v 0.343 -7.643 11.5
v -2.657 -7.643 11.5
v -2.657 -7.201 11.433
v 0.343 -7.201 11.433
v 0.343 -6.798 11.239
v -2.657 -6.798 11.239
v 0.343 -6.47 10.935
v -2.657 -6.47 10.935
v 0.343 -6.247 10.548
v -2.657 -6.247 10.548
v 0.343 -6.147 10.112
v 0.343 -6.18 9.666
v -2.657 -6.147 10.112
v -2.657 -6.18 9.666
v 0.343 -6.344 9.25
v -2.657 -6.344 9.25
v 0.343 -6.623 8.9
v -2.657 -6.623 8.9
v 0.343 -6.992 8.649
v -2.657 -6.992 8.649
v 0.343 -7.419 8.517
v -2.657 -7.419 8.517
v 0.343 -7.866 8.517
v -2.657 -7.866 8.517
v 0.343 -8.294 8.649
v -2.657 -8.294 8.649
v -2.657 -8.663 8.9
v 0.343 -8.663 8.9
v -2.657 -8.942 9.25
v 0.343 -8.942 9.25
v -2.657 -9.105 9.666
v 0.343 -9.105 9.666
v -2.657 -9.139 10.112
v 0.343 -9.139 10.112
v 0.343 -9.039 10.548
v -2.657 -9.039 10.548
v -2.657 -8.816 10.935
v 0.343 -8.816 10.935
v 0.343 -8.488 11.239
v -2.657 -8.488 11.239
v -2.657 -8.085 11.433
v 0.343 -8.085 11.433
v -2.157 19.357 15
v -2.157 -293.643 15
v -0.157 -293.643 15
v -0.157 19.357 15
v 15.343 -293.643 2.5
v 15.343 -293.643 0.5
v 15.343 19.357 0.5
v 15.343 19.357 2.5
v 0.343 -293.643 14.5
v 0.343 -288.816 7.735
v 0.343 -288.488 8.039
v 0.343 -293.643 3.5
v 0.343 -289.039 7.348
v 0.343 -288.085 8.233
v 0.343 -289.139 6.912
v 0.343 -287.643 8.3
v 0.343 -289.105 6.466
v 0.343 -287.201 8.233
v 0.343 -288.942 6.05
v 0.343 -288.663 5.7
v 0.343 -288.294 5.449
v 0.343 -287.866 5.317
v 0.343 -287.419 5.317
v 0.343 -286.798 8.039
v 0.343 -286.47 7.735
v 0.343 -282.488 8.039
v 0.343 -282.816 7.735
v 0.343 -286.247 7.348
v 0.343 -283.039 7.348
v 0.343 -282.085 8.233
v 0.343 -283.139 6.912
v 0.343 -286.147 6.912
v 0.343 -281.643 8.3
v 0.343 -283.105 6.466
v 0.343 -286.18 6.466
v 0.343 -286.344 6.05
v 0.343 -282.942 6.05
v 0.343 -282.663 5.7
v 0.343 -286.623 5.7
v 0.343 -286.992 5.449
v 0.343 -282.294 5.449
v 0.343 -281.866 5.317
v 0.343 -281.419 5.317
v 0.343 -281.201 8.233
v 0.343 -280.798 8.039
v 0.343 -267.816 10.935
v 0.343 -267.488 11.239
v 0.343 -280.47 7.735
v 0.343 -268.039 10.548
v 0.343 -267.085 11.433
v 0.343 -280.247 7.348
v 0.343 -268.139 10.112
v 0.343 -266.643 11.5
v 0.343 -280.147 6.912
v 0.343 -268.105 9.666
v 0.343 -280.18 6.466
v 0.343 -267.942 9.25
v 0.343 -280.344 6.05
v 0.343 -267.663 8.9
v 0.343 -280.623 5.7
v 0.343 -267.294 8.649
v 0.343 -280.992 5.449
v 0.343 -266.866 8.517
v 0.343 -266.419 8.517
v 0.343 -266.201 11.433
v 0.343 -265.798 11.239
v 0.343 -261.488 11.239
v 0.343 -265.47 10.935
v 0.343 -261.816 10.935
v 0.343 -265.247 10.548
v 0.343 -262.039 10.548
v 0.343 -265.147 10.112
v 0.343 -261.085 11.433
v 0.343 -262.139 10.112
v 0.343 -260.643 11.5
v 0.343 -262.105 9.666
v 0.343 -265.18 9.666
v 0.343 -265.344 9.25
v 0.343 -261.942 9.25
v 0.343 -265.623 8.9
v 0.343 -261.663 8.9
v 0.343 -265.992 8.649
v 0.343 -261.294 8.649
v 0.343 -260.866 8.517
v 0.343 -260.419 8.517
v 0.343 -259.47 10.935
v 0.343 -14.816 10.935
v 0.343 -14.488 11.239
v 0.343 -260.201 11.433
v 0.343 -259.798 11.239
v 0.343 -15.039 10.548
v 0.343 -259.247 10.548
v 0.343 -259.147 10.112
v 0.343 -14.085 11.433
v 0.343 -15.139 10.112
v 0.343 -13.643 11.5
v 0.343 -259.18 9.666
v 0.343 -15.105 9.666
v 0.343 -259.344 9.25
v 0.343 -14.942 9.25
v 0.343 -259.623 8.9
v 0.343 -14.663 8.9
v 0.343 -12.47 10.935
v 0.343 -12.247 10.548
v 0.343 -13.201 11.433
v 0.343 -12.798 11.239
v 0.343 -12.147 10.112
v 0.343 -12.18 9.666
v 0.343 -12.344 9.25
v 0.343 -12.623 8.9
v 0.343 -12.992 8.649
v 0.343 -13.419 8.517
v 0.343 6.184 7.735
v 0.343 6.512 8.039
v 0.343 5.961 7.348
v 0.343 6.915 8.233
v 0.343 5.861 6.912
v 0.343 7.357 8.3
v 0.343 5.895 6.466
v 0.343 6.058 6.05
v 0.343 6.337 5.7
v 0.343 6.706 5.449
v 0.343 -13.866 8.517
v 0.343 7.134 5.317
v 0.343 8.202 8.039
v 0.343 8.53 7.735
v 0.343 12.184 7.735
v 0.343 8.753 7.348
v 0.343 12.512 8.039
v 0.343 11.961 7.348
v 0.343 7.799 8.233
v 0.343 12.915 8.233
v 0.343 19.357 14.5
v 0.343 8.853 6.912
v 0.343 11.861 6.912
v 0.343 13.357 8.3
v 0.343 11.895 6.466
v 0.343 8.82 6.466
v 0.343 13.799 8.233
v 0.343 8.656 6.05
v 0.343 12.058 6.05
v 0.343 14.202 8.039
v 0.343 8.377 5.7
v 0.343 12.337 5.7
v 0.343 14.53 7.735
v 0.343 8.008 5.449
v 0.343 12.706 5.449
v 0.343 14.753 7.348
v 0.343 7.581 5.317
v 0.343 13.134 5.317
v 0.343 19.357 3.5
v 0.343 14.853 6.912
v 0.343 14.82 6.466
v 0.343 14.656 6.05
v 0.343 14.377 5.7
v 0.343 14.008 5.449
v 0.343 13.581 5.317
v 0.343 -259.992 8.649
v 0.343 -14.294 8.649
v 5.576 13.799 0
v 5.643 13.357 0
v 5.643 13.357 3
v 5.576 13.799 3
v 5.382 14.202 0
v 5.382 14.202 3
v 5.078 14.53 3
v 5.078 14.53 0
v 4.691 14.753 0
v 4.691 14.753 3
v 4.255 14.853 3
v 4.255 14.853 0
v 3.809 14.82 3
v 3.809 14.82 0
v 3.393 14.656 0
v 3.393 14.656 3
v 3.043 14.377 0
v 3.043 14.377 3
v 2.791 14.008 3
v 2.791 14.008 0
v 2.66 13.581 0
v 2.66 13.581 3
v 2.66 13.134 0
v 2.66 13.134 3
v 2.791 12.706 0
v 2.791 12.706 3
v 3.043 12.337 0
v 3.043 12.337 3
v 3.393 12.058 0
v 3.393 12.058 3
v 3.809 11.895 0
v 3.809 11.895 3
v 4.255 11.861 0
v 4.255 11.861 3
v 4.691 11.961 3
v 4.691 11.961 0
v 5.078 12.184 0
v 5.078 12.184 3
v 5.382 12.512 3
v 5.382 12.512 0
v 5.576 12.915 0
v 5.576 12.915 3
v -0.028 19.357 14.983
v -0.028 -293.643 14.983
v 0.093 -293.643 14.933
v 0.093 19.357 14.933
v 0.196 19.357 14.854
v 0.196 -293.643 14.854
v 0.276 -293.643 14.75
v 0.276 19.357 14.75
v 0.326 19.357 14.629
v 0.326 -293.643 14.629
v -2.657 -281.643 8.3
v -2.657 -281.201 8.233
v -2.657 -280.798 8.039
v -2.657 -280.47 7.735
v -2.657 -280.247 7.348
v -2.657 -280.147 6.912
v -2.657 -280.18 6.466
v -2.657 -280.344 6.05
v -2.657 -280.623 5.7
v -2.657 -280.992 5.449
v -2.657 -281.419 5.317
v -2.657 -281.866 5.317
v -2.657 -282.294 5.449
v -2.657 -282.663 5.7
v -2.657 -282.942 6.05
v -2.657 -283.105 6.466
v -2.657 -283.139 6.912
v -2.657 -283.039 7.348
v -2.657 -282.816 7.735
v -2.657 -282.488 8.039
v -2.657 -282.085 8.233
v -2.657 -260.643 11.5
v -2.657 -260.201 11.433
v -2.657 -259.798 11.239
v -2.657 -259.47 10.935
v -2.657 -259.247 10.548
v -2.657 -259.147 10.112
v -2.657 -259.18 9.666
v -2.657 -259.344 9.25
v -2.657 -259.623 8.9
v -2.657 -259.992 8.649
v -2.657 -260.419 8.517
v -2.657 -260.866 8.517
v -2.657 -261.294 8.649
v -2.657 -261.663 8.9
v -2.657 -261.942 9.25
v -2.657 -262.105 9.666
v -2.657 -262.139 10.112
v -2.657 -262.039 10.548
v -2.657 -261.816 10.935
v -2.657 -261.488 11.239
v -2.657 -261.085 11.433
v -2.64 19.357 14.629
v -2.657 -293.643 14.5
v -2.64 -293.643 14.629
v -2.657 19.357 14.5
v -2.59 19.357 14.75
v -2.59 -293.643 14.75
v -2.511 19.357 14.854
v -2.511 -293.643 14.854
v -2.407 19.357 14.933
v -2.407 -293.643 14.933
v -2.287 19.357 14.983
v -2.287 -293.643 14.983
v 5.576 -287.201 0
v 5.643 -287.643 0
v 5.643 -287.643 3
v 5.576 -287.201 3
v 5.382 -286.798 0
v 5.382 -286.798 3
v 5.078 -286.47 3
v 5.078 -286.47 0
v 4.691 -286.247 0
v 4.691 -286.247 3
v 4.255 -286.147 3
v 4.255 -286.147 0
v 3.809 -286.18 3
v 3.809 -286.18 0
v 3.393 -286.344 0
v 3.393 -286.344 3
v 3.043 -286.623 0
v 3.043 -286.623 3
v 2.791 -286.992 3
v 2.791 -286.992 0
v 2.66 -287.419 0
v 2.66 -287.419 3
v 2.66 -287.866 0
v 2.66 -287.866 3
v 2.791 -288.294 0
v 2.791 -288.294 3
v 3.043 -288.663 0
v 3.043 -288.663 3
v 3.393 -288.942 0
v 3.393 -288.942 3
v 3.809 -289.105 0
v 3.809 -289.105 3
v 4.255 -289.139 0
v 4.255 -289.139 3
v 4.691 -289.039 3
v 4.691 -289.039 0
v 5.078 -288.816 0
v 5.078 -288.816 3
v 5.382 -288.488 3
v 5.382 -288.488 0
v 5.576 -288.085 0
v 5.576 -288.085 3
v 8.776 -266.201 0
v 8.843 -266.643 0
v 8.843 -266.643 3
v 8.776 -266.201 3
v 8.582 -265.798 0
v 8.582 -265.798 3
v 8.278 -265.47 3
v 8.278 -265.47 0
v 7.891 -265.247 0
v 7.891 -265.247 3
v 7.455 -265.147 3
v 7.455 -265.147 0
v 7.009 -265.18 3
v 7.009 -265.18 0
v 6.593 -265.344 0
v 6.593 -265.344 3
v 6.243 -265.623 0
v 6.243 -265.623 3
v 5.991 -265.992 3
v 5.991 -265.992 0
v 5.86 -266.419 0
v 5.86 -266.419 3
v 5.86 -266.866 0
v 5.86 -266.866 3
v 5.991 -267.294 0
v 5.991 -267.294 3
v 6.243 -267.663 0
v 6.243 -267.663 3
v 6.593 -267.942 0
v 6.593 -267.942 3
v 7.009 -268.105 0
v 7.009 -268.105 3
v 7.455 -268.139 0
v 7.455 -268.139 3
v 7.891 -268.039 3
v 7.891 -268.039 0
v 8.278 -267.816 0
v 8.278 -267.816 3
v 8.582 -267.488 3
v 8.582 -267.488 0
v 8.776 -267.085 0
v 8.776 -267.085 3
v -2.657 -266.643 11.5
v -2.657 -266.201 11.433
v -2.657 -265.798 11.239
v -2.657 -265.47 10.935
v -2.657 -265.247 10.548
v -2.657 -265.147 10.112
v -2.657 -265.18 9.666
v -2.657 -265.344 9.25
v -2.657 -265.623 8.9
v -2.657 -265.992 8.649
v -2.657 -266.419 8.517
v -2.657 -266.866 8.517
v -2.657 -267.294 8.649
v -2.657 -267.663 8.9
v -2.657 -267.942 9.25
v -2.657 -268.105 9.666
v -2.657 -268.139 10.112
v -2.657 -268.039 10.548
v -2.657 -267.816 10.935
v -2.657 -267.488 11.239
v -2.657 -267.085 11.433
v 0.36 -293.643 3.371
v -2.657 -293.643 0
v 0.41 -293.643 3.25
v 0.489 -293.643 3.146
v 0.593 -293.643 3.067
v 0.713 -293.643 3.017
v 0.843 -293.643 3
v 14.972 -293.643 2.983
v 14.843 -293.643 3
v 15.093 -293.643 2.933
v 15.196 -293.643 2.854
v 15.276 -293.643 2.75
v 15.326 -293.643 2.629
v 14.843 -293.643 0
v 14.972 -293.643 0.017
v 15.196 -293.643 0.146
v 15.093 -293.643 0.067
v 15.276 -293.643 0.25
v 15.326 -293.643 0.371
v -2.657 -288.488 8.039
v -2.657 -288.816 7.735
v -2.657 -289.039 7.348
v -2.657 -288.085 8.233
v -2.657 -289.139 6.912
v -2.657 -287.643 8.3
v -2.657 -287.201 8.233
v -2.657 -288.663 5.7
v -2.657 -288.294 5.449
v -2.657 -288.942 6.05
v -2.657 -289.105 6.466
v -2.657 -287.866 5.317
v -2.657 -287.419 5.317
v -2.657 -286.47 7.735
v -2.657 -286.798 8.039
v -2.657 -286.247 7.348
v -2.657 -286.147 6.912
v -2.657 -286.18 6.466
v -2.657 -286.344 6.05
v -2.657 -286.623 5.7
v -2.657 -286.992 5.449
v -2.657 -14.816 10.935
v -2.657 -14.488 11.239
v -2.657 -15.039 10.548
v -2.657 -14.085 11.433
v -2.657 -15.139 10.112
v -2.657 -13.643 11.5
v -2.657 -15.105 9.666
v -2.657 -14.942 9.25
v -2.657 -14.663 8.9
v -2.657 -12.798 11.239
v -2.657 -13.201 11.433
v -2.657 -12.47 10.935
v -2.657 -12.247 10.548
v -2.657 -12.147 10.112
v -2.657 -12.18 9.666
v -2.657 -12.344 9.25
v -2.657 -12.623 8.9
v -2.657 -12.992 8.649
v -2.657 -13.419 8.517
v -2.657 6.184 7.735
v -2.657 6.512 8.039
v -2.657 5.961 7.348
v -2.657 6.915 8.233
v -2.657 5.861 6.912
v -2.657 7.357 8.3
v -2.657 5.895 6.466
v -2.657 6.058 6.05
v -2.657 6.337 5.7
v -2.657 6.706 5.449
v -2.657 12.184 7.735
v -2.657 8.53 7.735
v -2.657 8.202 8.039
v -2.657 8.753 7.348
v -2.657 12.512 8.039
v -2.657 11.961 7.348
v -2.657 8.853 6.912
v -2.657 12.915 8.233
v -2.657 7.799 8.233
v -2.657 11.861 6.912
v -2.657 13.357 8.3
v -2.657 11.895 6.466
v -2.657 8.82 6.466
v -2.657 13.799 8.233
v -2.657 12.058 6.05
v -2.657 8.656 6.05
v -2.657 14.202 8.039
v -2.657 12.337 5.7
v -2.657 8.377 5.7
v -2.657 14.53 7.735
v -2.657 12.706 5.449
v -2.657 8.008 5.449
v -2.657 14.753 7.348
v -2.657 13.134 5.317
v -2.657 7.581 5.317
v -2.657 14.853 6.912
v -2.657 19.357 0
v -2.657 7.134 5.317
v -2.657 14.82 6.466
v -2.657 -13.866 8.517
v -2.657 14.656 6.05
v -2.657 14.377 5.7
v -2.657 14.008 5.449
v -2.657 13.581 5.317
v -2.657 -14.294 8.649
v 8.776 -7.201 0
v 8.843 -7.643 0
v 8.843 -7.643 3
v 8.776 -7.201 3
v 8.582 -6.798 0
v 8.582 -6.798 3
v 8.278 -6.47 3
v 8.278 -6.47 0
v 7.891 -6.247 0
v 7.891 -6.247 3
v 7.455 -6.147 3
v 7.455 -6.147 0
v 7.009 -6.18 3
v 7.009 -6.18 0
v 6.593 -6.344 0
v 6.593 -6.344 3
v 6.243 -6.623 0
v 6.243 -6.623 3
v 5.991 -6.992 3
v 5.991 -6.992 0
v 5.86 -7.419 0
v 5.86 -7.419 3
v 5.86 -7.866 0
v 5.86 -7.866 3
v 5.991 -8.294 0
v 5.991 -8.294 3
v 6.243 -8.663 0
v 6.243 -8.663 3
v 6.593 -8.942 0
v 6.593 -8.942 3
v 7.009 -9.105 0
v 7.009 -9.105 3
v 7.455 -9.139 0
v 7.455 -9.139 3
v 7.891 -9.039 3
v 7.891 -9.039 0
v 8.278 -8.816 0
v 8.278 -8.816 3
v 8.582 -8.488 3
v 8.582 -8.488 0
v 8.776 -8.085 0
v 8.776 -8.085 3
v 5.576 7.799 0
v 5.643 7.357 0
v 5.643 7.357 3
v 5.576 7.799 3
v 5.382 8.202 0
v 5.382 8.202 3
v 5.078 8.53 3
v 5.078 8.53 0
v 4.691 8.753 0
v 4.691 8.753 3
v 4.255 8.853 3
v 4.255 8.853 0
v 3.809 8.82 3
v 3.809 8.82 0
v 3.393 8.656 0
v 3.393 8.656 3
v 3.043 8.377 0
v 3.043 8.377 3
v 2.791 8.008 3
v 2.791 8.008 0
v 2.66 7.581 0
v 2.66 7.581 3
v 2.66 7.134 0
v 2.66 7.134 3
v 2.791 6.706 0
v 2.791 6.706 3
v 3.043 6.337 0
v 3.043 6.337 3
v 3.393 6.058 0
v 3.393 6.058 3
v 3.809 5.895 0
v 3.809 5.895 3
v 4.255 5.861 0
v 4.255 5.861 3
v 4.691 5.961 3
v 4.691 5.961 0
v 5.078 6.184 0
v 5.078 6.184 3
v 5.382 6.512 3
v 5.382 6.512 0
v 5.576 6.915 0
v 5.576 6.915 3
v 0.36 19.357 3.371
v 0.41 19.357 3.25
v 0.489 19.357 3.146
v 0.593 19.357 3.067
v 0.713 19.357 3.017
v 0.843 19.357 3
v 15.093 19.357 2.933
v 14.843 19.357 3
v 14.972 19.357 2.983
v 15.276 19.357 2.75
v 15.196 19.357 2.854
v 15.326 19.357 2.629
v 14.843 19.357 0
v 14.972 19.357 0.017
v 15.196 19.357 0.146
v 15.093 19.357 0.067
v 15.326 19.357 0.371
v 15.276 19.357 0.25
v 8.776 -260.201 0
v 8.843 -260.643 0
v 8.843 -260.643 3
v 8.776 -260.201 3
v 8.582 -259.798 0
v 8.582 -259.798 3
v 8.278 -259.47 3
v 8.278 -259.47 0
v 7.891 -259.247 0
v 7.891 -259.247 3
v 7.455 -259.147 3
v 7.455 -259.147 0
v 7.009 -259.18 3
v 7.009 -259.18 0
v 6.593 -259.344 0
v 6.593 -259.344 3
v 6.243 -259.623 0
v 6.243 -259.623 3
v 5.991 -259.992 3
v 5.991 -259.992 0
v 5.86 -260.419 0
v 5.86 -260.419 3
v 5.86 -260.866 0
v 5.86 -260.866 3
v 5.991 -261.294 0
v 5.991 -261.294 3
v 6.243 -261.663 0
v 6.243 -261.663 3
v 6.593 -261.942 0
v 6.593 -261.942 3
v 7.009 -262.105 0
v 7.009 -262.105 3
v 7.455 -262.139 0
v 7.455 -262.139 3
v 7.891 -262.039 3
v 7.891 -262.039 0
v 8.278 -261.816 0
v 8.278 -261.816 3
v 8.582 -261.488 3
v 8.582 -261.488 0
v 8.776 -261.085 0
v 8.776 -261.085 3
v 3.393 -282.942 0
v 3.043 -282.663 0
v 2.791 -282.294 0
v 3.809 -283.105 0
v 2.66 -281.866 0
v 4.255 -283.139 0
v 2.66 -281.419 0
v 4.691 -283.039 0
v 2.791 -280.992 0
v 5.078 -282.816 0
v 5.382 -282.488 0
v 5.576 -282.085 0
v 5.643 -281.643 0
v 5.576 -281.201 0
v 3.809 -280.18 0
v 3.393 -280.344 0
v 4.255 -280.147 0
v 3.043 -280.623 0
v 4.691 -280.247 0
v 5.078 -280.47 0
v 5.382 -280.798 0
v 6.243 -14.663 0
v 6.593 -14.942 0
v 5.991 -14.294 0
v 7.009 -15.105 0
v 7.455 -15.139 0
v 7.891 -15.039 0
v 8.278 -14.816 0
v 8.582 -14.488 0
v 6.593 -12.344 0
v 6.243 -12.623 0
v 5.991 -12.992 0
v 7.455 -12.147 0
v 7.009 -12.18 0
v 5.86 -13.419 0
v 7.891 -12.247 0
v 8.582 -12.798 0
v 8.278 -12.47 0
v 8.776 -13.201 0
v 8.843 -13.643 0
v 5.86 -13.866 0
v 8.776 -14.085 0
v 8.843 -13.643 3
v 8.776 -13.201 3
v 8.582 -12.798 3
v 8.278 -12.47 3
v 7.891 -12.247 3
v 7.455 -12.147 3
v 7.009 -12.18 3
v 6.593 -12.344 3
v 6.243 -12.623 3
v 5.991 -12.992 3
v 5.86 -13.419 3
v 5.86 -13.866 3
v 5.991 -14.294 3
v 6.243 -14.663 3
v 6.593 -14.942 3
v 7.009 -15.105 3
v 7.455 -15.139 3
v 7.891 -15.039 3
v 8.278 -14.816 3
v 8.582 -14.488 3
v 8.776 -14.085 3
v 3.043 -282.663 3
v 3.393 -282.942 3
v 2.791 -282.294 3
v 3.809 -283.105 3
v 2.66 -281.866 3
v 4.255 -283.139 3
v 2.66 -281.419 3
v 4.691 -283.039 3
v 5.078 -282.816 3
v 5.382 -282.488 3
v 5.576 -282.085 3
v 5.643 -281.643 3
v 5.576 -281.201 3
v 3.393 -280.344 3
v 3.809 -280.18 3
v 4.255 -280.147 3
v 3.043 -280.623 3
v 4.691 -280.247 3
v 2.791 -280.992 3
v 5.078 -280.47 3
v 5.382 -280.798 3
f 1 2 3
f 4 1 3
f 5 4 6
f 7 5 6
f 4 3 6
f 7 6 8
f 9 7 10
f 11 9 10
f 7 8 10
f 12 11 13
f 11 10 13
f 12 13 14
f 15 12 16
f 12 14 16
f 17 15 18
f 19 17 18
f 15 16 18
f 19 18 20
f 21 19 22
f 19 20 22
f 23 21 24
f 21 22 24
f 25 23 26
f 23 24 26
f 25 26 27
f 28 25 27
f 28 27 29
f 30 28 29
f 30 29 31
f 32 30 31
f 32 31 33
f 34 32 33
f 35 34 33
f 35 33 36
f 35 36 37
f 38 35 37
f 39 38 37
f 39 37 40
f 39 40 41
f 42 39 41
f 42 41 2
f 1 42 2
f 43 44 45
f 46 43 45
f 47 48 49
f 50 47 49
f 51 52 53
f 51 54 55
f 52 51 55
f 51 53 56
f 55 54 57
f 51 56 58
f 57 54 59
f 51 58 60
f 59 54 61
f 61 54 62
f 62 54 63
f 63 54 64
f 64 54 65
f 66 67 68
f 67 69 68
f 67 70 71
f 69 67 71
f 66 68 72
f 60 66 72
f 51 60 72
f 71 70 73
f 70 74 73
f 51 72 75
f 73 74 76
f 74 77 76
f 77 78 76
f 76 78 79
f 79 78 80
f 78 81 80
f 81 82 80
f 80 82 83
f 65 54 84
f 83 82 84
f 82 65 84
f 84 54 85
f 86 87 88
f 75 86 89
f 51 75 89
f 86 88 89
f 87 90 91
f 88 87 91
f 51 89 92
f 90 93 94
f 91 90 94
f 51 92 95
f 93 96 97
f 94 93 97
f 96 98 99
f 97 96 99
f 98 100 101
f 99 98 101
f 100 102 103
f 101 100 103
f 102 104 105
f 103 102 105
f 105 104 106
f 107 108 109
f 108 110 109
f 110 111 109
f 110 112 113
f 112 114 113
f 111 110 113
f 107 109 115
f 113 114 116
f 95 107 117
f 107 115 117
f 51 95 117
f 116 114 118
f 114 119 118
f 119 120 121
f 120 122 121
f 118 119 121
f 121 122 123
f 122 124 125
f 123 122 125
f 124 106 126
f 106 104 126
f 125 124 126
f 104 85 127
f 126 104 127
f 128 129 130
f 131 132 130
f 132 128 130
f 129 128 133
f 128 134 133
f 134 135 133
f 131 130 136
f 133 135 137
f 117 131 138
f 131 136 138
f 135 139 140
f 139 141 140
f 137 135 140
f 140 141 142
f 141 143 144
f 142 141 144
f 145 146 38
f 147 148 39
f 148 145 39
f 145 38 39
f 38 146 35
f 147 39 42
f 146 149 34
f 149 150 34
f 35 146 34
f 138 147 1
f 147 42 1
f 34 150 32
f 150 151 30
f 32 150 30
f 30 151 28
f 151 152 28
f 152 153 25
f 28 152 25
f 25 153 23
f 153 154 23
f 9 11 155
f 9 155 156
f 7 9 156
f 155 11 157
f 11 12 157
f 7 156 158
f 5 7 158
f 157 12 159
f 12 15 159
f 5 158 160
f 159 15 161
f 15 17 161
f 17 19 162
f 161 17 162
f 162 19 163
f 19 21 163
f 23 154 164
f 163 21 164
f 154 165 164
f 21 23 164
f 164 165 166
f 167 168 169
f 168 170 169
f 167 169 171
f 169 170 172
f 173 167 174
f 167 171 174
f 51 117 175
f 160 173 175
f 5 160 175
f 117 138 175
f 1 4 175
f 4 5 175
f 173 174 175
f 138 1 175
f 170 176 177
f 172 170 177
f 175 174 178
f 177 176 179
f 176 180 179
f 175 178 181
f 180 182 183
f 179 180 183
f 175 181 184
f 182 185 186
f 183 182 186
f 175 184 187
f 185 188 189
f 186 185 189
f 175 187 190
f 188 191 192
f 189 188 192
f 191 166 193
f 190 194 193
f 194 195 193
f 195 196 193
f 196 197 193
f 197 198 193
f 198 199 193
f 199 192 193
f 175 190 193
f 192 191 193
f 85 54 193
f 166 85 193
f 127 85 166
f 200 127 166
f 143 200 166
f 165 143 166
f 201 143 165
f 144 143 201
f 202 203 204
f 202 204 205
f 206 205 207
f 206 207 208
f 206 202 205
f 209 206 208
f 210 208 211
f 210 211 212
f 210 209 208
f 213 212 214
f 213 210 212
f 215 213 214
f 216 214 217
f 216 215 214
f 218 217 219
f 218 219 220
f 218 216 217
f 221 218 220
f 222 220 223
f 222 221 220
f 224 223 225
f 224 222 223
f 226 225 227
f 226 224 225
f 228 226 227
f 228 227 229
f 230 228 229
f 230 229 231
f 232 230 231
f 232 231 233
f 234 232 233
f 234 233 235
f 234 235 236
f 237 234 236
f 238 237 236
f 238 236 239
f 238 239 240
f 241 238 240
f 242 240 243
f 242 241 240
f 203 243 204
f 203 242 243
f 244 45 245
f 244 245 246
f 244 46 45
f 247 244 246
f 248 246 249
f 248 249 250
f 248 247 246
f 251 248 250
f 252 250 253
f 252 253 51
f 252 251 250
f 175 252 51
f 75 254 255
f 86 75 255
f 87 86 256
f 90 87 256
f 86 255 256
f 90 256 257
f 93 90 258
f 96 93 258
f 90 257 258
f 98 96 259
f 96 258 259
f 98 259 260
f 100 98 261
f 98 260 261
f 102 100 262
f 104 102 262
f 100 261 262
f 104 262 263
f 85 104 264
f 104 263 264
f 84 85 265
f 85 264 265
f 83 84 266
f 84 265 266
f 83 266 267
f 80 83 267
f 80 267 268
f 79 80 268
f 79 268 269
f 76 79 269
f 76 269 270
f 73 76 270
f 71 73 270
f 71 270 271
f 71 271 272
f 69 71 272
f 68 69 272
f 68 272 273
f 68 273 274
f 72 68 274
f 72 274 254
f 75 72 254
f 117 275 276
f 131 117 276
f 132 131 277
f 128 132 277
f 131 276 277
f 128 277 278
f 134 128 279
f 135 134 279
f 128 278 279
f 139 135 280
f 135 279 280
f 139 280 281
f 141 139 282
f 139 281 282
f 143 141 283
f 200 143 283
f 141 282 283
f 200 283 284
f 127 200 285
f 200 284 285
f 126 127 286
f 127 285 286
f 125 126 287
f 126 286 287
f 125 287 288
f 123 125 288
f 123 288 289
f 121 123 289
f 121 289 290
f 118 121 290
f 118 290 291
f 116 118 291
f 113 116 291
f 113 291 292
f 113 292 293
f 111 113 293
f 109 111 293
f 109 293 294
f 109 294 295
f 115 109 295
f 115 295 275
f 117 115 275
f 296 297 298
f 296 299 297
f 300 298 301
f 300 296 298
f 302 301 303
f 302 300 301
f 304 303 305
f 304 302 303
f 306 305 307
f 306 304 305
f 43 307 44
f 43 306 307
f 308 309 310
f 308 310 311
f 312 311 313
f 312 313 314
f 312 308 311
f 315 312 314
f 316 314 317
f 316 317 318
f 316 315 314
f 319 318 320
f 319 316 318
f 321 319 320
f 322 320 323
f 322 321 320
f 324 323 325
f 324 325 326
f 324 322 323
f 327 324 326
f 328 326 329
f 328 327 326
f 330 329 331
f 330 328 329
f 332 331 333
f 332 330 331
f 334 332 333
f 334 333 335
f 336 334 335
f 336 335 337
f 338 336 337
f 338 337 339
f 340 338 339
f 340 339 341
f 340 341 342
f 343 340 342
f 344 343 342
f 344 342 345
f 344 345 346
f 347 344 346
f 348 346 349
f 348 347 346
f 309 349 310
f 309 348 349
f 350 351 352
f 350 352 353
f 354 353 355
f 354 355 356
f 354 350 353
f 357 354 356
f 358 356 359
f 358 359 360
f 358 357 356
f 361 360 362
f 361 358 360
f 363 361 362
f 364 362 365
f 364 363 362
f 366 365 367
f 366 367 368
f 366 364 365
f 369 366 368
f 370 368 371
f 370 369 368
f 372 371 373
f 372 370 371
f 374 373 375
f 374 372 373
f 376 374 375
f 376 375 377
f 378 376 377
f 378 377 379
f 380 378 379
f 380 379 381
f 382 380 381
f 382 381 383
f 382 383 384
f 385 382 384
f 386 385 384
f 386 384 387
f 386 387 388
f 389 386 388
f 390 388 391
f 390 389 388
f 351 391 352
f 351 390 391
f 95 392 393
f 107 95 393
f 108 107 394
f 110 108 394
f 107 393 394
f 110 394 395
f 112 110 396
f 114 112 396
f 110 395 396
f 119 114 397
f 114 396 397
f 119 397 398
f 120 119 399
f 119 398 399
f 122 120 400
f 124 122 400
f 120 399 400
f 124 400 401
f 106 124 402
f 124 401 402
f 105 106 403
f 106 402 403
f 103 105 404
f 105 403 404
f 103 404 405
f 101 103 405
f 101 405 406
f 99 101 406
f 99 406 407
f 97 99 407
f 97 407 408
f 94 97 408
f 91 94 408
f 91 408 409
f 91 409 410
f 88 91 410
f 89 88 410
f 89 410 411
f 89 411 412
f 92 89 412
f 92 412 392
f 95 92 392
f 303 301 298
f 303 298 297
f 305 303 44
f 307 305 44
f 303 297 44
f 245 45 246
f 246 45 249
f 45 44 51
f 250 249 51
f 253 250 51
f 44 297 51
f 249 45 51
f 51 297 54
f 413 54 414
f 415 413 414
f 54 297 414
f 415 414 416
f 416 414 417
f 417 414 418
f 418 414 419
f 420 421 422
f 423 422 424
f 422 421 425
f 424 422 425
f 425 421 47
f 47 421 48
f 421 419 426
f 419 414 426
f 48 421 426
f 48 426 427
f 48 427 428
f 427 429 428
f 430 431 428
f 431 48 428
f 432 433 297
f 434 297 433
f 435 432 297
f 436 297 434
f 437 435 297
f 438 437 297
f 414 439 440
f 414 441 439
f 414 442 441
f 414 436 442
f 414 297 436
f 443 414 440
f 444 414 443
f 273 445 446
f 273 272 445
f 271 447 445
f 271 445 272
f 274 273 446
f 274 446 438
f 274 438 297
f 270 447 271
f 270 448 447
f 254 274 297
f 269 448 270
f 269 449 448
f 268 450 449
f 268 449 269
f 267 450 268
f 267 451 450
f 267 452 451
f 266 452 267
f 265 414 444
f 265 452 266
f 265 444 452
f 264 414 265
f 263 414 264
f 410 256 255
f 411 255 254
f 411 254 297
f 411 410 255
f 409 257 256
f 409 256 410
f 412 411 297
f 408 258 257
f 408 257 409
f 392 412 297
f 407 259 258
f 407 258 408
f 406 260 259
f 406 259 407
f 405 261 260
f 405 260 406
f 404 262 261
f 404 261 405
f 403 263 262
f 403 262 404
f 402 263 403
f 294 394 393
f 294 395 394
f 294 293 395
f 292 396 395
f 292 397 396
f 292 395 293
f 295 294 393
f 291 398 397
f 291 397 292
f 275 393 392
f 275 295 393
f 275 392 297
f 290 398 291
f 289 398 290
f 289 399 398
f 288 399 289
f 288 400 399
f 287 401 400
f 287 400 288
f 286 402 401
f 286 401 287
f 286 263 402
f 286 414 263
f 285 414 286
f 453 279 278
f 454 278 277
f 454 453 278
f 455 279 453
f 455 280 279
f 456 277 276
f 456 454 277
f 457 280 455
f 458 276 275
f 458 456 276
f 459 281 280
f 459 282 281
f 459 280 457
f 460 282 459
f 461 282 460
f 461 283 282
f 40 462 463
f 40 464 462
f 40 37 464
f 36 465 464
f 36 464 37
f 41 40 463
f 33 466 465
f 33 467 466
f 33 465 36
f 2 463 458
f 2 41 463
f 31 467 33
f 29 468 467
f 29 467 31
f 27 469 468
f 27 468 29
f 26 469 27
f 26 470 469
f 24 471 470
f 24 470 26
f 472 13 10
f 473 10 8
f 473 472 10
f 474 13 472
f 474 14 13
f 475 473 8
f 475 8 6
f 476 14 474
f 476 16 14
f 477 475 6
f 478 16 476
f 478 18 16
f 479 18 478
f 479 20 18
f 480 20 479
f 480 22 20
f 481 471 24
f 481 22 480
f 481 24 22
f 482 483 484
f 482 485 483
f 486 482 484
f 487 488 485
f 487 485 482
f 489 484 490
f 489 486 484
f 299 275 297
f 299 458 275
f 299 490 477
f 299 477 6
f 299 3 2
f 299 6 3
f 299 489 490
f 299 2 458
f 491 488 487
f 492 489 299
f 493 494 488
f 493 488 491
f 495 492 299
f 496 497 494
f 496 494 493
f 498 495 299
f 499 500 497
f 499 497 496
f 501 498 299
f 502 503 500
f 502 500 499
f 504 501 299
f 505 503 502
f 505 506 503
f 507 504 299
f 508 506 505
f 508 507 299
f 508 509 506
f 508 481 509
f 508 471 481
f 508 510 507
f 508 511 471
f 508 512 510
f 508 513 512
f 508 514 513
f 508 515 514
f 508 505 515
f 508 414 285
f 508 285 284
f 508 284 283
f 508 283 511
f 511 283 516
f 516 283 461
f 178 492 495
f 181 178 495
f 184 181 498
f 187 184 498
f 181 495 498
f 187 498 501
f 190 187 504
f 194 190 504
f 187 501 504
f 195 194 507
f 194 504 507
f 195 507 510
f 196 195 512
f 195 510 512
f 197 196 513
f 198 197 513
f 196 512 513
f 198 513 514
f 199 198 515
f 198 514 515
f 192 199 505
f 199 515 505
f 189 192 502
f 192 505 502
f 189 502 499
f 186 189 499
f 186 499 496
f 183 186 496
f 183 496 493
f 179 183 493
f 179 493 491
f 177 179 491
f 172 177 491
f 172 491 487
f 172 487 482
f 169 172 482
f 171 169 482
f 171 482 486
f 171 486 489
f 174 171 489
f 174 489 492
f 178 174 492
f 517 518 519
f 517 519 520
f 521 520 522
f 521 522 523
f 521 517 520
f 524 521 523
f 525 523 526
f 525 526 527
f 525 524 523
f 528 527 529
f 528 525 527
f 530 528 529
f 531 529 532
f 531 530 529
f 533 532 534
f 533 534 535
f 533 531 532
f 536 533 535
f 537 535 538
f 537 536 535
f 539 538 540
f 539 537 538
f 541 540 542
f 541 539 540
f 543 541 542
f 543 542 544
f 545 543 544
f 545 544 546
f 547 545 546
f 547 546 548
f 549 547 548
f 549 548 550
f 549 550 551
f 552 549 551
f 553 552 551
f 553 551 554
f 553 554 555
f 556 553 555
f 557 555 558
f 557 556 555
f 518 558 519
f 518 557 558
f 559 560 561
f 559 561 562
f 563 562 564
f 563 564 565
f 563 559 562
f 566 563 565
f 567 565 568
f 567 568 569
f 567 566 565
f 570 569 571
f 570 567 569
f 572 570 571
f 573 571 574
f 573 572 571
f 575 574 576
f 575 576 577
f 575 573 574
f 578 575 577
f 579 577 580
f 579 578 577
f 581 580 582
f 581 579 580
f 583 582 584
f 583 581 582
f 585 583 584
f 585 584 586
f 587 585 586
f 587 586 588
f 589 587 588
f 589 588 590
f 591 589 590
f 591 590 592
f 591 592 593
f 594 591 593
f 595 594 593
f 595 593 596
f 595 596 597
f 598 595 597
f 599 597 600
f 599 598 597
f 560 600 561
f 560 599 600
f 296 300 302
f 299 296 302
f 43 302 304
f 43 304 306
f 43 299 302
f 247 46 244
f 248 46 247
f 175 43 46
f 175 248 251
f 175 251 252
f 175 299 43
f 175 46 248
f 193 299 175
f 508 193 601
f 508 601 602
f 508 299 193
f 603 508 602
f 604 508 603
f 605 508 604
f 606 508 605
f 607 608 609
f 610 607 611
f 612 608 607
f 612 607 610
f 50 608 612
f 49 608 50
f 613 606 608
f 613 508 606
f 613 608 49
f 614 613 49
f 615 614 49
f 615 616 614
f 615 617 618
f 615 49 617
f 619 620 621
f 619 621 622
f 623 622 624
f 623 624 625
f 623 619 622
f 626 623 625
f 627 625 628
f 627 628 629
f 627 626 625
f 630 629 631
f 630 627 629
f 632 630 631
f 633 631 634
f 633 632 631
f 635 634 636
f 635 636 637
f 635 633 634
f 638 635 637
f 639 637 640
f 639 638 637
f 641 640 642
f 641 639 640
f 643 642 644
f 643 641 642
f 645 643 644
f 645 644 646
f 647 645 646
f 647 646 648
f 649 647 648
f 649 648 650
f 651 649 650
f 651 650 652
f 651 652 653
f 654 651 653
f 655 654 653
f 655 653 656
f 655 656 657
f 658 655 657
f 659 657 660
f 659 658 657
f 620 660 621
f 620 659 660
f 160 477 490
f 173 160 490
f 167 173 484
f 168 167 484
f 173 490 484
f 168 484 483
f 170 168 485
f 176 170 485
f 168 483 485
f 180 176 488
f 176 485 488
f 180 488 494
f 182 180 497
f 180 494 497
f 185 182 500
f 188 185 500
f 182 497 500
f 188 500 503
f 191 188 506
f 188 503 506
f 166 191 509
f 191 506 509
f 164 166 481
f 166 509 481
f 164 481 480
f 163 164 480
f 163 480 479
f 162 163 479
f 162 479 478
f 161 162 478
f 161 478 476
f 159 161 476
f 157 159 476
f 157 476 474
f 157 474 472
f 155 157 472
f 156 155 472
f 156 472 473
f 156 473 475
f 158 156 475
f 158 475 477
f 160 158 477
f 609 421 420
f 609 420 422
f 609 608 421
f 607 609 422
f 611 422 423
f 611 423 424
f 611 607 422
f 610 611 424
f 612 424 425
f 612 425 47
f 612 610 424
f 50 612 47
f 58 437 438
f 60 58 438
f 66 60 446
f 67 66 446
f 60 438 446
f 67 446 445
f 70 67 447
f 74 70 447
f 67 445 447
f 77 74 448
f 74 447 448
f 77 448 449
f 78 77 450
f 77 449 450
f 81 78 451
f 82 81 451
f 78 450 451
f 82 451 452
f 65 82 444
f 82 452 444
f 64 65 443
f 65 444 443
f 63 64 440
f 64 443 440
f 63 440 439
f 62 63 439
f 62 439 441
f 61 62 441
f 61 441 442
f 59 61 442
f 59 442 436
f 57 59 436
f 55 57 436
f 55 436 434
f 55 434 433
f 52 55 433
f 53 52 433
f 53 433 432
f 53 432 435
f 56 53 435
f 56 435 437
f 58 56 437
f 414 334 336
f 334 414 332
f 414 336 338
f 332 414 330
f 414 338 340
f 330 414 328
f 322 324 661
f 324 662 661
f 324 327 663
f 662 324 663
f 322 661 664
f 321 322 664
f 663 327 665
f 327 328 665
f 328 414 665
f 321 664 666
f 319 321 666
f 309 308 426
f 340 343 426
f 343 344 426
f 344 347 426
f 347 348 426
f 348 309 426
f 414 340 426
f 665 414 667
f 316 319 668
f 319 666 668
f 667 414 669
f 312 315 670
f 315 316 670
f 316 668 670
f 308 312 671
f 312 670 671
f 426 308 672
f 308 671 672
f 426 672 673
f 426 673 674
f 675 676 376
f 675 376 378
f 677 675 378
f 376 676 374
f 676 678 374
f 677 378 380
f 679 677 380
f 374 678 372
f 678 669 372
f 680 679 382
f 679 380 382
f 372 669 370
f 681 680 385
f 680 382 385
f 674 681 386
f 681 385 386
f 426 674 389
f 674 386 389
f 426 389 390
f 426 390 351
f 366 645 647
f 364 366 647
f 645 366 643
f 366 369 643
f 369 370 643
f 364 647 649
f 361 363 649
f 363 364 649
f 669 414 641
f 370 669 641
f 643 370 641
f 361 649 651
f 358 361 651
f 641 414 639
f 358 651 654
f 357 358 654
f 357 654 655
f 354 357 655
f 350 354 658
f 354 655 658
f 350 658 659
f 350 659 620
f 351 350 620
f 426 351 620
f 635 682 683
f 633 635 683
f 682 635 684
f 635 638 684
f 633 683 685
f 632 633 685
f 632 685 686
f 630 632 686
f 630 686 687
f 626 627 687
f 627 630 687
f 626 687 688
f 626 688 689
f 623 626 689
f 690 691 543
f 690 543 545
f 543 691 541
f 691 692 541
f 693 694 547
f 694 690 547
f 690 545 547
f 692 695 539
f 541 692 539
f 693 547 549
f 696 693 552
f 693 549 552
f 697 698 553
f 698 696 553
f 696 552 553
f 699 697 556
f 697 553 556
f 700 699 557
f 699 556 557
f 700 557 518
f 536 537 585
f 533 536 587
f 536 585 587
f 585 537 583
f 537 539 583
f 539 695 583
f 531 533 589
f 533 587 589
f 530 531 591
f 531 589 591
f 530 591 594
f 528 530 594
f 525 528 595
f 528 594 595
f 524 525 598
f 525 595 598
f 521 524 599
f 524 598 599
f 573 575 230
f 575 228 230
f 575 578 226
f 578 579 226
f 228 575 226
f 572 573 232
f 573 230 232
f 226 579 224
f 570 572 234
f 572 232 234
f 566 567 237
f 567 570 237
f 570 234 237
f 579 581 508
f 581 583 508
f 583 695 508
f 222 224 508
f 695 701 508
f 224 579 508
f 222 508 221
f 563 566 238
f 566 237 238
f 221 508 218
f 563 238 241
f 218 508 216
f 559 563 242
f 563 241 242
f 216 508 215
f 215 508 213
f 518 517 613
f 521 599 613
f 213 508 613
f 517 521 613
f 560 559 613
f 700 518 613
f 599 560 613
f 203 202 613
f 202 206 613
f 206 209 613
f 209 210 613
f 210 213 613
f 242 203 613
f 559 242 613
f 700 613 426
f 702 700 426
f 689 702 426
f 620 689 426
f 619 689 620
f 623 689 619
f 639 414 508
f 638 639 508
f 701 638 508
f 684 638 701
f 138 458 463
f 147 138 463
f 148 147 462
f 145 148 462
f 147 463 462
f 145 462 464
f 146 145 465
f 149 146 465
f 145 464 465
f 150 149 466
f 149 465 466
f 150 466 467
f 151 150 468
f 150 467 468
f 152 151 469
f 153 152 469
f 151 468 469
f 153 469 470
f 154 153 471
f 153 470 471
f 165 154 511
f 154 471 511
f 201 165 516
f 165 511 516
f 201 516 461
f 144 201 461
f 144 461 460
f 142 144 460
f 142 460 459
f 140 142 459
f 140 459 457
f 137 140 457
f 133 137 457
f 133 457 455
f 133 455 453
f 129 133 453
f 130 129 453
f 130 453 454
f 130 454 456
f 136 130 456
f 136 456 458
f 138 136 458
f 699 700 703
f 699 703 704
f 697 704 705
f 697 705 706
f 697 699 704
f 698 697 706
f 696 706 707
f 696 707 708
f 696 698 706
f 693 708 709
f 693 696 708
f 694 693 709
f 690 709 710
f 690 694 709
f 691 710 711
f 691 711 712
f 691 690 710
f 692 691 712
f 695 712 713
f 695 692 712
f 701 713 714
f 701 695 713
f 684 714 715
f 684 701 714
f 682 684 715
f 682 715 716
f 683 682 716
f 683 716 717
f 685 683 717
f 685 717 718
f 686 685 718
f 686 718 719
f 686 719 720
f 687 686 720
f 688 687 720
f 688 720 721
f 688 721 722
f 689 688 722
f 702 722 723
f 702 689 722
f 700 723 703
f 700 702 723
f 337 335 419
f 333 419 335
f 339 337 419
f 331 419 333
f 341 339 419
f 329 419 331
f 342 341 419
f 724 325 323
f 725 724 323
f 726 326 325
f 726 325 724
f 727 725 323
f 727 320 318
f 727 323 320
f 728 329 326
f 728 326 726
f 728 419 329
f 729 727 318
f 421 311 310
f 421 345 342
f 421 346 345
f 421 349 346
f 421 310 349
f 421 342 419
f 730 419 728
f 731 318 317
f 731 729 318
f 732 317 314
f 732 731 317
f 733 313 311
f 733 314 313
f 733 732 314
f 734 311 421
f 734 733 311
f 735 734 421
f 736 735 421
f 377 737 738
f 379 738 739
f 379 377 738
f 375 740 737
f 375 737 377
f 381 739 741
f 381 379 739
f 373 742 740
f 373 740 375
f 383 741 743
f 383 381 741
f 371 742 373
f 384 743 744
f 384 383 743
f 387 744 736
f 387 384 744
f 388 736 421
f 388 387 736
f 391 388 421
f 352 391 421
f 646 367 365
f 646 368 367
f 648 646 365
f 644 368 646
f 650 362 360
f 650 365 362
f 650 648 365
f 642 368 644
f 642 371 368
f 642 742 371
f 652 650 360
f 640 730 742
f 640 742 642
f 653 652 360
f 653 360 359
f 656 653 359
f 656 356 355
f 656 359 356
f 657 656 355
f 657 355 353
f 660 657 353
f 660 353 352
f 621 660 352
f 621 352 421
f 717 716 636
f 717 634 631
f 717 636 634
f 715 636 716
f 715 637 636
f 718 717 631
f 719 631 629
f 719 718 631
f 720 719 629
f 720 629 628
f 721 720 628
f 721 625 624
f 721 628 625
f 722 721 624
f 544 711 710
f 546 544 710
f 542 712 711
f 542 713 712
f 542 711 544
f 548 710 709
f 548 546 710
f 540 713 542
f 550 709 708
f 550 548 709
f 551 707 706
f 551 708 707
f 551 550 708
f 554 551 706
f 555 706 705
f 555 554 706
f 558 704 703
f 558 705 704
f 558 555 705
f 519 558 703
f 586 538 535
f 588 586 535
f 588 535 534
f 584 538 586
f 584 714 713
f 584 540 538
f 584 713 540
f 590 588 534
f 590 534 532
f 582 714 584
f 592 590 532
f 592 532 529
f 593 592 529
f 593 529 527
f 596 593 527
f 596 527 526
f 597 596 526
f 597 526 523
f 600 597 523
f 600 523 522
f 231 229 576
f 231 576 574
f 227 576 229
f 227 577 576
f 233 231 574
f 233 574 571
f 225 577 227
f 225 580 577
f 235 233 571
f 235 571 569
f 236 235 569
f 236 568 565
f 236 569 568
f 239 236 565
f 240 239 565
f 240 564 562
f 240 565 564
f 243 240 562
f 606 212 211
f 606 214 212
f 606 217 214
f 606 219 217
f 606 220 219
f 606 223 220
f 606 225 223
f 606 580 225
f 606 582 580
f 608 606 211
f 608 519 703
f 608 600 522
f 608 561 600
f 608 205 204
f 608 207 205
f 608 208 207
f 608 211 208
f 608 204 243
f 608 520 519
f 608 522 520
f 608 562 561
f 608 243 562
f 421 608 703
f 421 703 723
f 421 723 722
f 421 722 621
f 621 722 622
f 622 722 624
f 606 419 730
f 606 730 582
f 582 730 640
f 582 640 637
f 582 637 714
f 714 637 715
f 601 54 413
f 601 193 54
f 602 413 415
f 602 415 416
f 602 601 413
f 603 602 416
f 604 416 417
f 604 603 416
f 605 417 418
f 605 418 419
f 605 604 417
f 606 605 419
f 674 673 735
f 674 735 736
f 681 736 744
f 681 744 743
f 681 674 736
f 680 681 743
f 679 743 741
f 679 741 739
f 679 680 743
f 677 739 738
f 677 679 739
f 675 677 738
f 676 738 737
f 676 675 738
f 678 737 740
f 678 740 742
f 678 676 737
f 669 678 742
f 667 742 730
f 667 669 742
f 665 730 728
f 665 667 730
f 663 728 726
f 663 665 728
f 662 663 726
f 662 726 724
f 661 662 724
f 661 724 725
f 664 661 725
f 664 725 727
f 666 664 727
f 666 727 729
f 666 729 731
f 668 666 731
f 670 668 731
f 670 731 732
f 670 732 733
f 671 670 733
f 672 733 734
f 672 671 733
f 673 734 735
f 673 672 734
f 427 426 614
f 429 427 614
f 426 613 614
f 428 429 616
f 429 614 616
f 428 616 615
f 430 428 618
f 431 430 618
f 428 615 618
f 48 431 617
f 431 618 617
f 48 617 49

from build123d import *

# Parameters (mm, degrees)
SKETCH1_W           = 15
SKETCH1_H           = 313
SKETCH1_R           = 1.5
BOSS_EXTRUDE2_DEPTH = 3
SKETCH1_4_W         = 3
SKETCH1_4_H         = 313
BOSS_EXTRUDE3_DEPTH = 15
CUT_EXTRUDE1_REACH  = 296.576
SKETCH2_R           = 1.5
FILLET1_R           = 0.5


with BuildPart() as part:
    # Sketch1 → Boss-Extrude2 (new body)
    with BuildSketch(Plane.XY):
        with Locations((7.842857143, -137.142857143)):
            Rectangle(SKETCH1_W, SKETCH1_H)
        with Locations((4.142857143, -287.642857143)):
            Circle(SKETCH1_R, mode=Mode.SUBTRACT)
        with Locations((4.142857143, -281.642857143)):
            Circle(SKETCH1_R, mode=Mode.SUBTRACT)
        with Locations((7.342857143, -266.642857143)):
            Circle(SKETCH1_R, mode=Mode.SUBTRACT)
        with Locations((7.342857143, -260.642857143)):
            Circle(SKETCH1_R, mode=Mode.SUBTRACT)
        with Locations((4.142857143, 7.357142857)):
            Circle(SKETCH1_R, mode=Mode.SUBTRACT)
        with Locations((4.142857143, 13.357142857)):
            Circle(SKETCH1_R, mode=Mode.SUBTRACT)
        with Locations((7.342857143, -13.642857143)):
            Circle(SKETCH1_R, mode=Mode.SUBTRACT)
        with Locations((7.342857143, -7.642857143)):
            Circle(SKETCH1_R, mode=Mode.SUBTRACT)
    extrude(amount=BOSS_EXTRUDE2_DEPTH)

    # Sketch1<4> → Boss-Extrude3 (add)
    with BuildSketch(Plane.XY):
        with Locations((-1.157142857, -137.142857143)):
            Rectangle(SKETCH1_4_W, SKETCH1_4_H)
    extrude(amount=BOSS_EXTRUDE3_DEPTH)

    # Sketch2 → Cut-Extrude1 (cut, up to next)
    with BuildSketch(Plane.ZY.offset(2.657142857), mode=Mode.PRIVATE) as cut_extrude1_sk1:
        with Locations((6.8, 13.357142857)):
            Circle(SKETCH2_R)
    cut_extrude1_tool1 = extrude(cut_extrude1_sk1.sketch, amount=-CUT_EXTRUDE1_REACH, mode=Mode.PRIVATE) & part.part
    # Sketch2 → Cut-Extrude1 (cut, up to next)
    with BuildSketch(Plane.ZY.offset(2.657142857), mode=Mode.PRIVATE) as cut_extrude1_sk2:
        with Locations((6.8, -287.642857143)):
            Circle(SKETCH2_R)
    cut_extrude1_tool2 = extrude(cut_extrude1_sk2.sketch, amount=-CUT_EXTRUDE1_REACH, mode=Mode.PRIVATE) & part.part
    # Sketch2 → Cut-Extrude1 (cut, up to next)
    with BuildSketch(Plane.ZY.offset(2.657142857), mode=Mode.PRIVATE) as cut_extrude1_sk3:
        with Locations((6.8, -281.642857143)):
            Circle(SKETCH2_R)
    cut_extrude1_tool3 = extrude(cut_extrude1_sk3.sketch, amount=-CUT_EXTRUDE1_REACH, mode=Mode.PRIVATE) & part.part
    # Sketch2 → Cut-Extrude1 (cut, up to next)
    with BuildSketch(Plane.ZY.offset(2.657142857), mode=Mode.PRIVATE) as cut_extrude1_sk4:
        with Locations((6.8, 7.357142857)):
            Circle(SKETCH2_R)
    cut_extrude1_tool4 = extrude(cut_extrude1_sk4.sketch, amount=-CUT_EXTRUDE1_REACH, mode=Mode.PRIVATE) & part.part
    # Sketch2 → Cut-Extrude1 (cut, up to next)
    with BuildSketch(Plane.ZY.offset(2.657142857), mode=Mode.PRIVATE) as cut_extrude1_sk5:
        with Locations((10, -266.642857143)):
            Circle(SKETCH2_R)
    cut_extrude1_tool5 = extrude(cut_extrude1_sk5.sketch, amount=-CUT_EXTRUDE1_REACH, mode=Mode.PRIVATE) & part.part
    # Sketch2 → Cut-Extrude1 (cut, up to next)
    with BuildSketch(Plane.ZY.offset(2.657142857), mode=Mode.PRIVATE) as cut_extrude1_sk6:
        with Locations((10, -260.642857143)):
            Circle(SKETCH2_R)
    cut_extrude1_tool6 = extrude(cut_extrude1_sk6.sketch, amount=-CUT_EXTRUDE1_REACH, mode=Mode.PRIVATE) & part.part
    # Sketch2 → Cut-Extrude1 (cut, up to next)
    with BuildSketch(Plane.ZY.offset(2.657142857), mode=Mode.PRIVATE) as cut_extrude1_sk7:
        with Locations((10, -13.642857143)):
            Circle(SKETCH2_R)
    cut_extrude1_tool7 = extrude(cut_extrude1_sk7.sketch, amount=-CUT_EXTRUDE1_REACH, mode=Mode.PRIVATE) & part.part
    # Sketch2 → Cut-Extrude1 (cut, up to next)
    with BuildSketch(Plane.ZY.offset(2.657142857), mode=Mode.PRIVATE) as cut_extrude1_sk8:
        with Locations((10, -7.642857143)):
            Circle(SKETCH2_R)
    cut_extrude1_tool8 = extrude(cut_extrude1_sk8.sketch, amount=-CUT_EXTRUDE1_REACH, mode=Mode.PRIVATE) & part.part
    add(cut_extrude1_tool1.solids().sort_by_distance((-2.657143, 13.357143, 6.8))[0], mode=Mode.SUBTRACT)
    add(cut_extrude1_tool2.solids().sort_by_distance((-2.657143, -287.642857, 6.8))[0], mode=Mode.SUBTRACT)
    add(cut_extrude1_tool3.solids().sort_by_distance((-2.657143, -281.642857, 6.8))[0], mode=Mode.SUBTRACT)
    add(cut_extrude1_tool4.solids().sort_by_distance((-2.657143, 7.357143, 6.8))[0], mode=Mode.SUBTRACT)
    add(cut_extrude1_tool5.solids().sort_by_distance((-2.657143, -266.642857, 10))[0], mode=Mode.SUBTRACT)
    add(cut_extrude1_tool6.solids().sort_by_distance((-2.657143, -260.642857, 10))[0], mode=Mode.SUBTRACT)
    add(cut_extrude1_tool7.solids().sort_by_distance((-2.657143, -13.642857, 10))[0], mode=Mode.SUBTRACT)
    add(cut_extrude1_tool8.solids().sort_by_distance((-2.657143, -7.642857, 10))[0], mode=Mode.SUBTRACT)

    # Fillet1
    fillet1_edges = [part.edges().sort_by_distance(p)[0] for p in [
        (15.342857143, -137.142857143, 0),
        (15.342857143, -137.142857143, 3),
        (-2.657142857, -137.142857143, 15),
        (0.342857143, -137.142857143, 15),
        (0.342857143, -137.142857143, 3),
    ]]
    fillet(fillet1_edges, radius=FILLET1_R)


solid = part.part
